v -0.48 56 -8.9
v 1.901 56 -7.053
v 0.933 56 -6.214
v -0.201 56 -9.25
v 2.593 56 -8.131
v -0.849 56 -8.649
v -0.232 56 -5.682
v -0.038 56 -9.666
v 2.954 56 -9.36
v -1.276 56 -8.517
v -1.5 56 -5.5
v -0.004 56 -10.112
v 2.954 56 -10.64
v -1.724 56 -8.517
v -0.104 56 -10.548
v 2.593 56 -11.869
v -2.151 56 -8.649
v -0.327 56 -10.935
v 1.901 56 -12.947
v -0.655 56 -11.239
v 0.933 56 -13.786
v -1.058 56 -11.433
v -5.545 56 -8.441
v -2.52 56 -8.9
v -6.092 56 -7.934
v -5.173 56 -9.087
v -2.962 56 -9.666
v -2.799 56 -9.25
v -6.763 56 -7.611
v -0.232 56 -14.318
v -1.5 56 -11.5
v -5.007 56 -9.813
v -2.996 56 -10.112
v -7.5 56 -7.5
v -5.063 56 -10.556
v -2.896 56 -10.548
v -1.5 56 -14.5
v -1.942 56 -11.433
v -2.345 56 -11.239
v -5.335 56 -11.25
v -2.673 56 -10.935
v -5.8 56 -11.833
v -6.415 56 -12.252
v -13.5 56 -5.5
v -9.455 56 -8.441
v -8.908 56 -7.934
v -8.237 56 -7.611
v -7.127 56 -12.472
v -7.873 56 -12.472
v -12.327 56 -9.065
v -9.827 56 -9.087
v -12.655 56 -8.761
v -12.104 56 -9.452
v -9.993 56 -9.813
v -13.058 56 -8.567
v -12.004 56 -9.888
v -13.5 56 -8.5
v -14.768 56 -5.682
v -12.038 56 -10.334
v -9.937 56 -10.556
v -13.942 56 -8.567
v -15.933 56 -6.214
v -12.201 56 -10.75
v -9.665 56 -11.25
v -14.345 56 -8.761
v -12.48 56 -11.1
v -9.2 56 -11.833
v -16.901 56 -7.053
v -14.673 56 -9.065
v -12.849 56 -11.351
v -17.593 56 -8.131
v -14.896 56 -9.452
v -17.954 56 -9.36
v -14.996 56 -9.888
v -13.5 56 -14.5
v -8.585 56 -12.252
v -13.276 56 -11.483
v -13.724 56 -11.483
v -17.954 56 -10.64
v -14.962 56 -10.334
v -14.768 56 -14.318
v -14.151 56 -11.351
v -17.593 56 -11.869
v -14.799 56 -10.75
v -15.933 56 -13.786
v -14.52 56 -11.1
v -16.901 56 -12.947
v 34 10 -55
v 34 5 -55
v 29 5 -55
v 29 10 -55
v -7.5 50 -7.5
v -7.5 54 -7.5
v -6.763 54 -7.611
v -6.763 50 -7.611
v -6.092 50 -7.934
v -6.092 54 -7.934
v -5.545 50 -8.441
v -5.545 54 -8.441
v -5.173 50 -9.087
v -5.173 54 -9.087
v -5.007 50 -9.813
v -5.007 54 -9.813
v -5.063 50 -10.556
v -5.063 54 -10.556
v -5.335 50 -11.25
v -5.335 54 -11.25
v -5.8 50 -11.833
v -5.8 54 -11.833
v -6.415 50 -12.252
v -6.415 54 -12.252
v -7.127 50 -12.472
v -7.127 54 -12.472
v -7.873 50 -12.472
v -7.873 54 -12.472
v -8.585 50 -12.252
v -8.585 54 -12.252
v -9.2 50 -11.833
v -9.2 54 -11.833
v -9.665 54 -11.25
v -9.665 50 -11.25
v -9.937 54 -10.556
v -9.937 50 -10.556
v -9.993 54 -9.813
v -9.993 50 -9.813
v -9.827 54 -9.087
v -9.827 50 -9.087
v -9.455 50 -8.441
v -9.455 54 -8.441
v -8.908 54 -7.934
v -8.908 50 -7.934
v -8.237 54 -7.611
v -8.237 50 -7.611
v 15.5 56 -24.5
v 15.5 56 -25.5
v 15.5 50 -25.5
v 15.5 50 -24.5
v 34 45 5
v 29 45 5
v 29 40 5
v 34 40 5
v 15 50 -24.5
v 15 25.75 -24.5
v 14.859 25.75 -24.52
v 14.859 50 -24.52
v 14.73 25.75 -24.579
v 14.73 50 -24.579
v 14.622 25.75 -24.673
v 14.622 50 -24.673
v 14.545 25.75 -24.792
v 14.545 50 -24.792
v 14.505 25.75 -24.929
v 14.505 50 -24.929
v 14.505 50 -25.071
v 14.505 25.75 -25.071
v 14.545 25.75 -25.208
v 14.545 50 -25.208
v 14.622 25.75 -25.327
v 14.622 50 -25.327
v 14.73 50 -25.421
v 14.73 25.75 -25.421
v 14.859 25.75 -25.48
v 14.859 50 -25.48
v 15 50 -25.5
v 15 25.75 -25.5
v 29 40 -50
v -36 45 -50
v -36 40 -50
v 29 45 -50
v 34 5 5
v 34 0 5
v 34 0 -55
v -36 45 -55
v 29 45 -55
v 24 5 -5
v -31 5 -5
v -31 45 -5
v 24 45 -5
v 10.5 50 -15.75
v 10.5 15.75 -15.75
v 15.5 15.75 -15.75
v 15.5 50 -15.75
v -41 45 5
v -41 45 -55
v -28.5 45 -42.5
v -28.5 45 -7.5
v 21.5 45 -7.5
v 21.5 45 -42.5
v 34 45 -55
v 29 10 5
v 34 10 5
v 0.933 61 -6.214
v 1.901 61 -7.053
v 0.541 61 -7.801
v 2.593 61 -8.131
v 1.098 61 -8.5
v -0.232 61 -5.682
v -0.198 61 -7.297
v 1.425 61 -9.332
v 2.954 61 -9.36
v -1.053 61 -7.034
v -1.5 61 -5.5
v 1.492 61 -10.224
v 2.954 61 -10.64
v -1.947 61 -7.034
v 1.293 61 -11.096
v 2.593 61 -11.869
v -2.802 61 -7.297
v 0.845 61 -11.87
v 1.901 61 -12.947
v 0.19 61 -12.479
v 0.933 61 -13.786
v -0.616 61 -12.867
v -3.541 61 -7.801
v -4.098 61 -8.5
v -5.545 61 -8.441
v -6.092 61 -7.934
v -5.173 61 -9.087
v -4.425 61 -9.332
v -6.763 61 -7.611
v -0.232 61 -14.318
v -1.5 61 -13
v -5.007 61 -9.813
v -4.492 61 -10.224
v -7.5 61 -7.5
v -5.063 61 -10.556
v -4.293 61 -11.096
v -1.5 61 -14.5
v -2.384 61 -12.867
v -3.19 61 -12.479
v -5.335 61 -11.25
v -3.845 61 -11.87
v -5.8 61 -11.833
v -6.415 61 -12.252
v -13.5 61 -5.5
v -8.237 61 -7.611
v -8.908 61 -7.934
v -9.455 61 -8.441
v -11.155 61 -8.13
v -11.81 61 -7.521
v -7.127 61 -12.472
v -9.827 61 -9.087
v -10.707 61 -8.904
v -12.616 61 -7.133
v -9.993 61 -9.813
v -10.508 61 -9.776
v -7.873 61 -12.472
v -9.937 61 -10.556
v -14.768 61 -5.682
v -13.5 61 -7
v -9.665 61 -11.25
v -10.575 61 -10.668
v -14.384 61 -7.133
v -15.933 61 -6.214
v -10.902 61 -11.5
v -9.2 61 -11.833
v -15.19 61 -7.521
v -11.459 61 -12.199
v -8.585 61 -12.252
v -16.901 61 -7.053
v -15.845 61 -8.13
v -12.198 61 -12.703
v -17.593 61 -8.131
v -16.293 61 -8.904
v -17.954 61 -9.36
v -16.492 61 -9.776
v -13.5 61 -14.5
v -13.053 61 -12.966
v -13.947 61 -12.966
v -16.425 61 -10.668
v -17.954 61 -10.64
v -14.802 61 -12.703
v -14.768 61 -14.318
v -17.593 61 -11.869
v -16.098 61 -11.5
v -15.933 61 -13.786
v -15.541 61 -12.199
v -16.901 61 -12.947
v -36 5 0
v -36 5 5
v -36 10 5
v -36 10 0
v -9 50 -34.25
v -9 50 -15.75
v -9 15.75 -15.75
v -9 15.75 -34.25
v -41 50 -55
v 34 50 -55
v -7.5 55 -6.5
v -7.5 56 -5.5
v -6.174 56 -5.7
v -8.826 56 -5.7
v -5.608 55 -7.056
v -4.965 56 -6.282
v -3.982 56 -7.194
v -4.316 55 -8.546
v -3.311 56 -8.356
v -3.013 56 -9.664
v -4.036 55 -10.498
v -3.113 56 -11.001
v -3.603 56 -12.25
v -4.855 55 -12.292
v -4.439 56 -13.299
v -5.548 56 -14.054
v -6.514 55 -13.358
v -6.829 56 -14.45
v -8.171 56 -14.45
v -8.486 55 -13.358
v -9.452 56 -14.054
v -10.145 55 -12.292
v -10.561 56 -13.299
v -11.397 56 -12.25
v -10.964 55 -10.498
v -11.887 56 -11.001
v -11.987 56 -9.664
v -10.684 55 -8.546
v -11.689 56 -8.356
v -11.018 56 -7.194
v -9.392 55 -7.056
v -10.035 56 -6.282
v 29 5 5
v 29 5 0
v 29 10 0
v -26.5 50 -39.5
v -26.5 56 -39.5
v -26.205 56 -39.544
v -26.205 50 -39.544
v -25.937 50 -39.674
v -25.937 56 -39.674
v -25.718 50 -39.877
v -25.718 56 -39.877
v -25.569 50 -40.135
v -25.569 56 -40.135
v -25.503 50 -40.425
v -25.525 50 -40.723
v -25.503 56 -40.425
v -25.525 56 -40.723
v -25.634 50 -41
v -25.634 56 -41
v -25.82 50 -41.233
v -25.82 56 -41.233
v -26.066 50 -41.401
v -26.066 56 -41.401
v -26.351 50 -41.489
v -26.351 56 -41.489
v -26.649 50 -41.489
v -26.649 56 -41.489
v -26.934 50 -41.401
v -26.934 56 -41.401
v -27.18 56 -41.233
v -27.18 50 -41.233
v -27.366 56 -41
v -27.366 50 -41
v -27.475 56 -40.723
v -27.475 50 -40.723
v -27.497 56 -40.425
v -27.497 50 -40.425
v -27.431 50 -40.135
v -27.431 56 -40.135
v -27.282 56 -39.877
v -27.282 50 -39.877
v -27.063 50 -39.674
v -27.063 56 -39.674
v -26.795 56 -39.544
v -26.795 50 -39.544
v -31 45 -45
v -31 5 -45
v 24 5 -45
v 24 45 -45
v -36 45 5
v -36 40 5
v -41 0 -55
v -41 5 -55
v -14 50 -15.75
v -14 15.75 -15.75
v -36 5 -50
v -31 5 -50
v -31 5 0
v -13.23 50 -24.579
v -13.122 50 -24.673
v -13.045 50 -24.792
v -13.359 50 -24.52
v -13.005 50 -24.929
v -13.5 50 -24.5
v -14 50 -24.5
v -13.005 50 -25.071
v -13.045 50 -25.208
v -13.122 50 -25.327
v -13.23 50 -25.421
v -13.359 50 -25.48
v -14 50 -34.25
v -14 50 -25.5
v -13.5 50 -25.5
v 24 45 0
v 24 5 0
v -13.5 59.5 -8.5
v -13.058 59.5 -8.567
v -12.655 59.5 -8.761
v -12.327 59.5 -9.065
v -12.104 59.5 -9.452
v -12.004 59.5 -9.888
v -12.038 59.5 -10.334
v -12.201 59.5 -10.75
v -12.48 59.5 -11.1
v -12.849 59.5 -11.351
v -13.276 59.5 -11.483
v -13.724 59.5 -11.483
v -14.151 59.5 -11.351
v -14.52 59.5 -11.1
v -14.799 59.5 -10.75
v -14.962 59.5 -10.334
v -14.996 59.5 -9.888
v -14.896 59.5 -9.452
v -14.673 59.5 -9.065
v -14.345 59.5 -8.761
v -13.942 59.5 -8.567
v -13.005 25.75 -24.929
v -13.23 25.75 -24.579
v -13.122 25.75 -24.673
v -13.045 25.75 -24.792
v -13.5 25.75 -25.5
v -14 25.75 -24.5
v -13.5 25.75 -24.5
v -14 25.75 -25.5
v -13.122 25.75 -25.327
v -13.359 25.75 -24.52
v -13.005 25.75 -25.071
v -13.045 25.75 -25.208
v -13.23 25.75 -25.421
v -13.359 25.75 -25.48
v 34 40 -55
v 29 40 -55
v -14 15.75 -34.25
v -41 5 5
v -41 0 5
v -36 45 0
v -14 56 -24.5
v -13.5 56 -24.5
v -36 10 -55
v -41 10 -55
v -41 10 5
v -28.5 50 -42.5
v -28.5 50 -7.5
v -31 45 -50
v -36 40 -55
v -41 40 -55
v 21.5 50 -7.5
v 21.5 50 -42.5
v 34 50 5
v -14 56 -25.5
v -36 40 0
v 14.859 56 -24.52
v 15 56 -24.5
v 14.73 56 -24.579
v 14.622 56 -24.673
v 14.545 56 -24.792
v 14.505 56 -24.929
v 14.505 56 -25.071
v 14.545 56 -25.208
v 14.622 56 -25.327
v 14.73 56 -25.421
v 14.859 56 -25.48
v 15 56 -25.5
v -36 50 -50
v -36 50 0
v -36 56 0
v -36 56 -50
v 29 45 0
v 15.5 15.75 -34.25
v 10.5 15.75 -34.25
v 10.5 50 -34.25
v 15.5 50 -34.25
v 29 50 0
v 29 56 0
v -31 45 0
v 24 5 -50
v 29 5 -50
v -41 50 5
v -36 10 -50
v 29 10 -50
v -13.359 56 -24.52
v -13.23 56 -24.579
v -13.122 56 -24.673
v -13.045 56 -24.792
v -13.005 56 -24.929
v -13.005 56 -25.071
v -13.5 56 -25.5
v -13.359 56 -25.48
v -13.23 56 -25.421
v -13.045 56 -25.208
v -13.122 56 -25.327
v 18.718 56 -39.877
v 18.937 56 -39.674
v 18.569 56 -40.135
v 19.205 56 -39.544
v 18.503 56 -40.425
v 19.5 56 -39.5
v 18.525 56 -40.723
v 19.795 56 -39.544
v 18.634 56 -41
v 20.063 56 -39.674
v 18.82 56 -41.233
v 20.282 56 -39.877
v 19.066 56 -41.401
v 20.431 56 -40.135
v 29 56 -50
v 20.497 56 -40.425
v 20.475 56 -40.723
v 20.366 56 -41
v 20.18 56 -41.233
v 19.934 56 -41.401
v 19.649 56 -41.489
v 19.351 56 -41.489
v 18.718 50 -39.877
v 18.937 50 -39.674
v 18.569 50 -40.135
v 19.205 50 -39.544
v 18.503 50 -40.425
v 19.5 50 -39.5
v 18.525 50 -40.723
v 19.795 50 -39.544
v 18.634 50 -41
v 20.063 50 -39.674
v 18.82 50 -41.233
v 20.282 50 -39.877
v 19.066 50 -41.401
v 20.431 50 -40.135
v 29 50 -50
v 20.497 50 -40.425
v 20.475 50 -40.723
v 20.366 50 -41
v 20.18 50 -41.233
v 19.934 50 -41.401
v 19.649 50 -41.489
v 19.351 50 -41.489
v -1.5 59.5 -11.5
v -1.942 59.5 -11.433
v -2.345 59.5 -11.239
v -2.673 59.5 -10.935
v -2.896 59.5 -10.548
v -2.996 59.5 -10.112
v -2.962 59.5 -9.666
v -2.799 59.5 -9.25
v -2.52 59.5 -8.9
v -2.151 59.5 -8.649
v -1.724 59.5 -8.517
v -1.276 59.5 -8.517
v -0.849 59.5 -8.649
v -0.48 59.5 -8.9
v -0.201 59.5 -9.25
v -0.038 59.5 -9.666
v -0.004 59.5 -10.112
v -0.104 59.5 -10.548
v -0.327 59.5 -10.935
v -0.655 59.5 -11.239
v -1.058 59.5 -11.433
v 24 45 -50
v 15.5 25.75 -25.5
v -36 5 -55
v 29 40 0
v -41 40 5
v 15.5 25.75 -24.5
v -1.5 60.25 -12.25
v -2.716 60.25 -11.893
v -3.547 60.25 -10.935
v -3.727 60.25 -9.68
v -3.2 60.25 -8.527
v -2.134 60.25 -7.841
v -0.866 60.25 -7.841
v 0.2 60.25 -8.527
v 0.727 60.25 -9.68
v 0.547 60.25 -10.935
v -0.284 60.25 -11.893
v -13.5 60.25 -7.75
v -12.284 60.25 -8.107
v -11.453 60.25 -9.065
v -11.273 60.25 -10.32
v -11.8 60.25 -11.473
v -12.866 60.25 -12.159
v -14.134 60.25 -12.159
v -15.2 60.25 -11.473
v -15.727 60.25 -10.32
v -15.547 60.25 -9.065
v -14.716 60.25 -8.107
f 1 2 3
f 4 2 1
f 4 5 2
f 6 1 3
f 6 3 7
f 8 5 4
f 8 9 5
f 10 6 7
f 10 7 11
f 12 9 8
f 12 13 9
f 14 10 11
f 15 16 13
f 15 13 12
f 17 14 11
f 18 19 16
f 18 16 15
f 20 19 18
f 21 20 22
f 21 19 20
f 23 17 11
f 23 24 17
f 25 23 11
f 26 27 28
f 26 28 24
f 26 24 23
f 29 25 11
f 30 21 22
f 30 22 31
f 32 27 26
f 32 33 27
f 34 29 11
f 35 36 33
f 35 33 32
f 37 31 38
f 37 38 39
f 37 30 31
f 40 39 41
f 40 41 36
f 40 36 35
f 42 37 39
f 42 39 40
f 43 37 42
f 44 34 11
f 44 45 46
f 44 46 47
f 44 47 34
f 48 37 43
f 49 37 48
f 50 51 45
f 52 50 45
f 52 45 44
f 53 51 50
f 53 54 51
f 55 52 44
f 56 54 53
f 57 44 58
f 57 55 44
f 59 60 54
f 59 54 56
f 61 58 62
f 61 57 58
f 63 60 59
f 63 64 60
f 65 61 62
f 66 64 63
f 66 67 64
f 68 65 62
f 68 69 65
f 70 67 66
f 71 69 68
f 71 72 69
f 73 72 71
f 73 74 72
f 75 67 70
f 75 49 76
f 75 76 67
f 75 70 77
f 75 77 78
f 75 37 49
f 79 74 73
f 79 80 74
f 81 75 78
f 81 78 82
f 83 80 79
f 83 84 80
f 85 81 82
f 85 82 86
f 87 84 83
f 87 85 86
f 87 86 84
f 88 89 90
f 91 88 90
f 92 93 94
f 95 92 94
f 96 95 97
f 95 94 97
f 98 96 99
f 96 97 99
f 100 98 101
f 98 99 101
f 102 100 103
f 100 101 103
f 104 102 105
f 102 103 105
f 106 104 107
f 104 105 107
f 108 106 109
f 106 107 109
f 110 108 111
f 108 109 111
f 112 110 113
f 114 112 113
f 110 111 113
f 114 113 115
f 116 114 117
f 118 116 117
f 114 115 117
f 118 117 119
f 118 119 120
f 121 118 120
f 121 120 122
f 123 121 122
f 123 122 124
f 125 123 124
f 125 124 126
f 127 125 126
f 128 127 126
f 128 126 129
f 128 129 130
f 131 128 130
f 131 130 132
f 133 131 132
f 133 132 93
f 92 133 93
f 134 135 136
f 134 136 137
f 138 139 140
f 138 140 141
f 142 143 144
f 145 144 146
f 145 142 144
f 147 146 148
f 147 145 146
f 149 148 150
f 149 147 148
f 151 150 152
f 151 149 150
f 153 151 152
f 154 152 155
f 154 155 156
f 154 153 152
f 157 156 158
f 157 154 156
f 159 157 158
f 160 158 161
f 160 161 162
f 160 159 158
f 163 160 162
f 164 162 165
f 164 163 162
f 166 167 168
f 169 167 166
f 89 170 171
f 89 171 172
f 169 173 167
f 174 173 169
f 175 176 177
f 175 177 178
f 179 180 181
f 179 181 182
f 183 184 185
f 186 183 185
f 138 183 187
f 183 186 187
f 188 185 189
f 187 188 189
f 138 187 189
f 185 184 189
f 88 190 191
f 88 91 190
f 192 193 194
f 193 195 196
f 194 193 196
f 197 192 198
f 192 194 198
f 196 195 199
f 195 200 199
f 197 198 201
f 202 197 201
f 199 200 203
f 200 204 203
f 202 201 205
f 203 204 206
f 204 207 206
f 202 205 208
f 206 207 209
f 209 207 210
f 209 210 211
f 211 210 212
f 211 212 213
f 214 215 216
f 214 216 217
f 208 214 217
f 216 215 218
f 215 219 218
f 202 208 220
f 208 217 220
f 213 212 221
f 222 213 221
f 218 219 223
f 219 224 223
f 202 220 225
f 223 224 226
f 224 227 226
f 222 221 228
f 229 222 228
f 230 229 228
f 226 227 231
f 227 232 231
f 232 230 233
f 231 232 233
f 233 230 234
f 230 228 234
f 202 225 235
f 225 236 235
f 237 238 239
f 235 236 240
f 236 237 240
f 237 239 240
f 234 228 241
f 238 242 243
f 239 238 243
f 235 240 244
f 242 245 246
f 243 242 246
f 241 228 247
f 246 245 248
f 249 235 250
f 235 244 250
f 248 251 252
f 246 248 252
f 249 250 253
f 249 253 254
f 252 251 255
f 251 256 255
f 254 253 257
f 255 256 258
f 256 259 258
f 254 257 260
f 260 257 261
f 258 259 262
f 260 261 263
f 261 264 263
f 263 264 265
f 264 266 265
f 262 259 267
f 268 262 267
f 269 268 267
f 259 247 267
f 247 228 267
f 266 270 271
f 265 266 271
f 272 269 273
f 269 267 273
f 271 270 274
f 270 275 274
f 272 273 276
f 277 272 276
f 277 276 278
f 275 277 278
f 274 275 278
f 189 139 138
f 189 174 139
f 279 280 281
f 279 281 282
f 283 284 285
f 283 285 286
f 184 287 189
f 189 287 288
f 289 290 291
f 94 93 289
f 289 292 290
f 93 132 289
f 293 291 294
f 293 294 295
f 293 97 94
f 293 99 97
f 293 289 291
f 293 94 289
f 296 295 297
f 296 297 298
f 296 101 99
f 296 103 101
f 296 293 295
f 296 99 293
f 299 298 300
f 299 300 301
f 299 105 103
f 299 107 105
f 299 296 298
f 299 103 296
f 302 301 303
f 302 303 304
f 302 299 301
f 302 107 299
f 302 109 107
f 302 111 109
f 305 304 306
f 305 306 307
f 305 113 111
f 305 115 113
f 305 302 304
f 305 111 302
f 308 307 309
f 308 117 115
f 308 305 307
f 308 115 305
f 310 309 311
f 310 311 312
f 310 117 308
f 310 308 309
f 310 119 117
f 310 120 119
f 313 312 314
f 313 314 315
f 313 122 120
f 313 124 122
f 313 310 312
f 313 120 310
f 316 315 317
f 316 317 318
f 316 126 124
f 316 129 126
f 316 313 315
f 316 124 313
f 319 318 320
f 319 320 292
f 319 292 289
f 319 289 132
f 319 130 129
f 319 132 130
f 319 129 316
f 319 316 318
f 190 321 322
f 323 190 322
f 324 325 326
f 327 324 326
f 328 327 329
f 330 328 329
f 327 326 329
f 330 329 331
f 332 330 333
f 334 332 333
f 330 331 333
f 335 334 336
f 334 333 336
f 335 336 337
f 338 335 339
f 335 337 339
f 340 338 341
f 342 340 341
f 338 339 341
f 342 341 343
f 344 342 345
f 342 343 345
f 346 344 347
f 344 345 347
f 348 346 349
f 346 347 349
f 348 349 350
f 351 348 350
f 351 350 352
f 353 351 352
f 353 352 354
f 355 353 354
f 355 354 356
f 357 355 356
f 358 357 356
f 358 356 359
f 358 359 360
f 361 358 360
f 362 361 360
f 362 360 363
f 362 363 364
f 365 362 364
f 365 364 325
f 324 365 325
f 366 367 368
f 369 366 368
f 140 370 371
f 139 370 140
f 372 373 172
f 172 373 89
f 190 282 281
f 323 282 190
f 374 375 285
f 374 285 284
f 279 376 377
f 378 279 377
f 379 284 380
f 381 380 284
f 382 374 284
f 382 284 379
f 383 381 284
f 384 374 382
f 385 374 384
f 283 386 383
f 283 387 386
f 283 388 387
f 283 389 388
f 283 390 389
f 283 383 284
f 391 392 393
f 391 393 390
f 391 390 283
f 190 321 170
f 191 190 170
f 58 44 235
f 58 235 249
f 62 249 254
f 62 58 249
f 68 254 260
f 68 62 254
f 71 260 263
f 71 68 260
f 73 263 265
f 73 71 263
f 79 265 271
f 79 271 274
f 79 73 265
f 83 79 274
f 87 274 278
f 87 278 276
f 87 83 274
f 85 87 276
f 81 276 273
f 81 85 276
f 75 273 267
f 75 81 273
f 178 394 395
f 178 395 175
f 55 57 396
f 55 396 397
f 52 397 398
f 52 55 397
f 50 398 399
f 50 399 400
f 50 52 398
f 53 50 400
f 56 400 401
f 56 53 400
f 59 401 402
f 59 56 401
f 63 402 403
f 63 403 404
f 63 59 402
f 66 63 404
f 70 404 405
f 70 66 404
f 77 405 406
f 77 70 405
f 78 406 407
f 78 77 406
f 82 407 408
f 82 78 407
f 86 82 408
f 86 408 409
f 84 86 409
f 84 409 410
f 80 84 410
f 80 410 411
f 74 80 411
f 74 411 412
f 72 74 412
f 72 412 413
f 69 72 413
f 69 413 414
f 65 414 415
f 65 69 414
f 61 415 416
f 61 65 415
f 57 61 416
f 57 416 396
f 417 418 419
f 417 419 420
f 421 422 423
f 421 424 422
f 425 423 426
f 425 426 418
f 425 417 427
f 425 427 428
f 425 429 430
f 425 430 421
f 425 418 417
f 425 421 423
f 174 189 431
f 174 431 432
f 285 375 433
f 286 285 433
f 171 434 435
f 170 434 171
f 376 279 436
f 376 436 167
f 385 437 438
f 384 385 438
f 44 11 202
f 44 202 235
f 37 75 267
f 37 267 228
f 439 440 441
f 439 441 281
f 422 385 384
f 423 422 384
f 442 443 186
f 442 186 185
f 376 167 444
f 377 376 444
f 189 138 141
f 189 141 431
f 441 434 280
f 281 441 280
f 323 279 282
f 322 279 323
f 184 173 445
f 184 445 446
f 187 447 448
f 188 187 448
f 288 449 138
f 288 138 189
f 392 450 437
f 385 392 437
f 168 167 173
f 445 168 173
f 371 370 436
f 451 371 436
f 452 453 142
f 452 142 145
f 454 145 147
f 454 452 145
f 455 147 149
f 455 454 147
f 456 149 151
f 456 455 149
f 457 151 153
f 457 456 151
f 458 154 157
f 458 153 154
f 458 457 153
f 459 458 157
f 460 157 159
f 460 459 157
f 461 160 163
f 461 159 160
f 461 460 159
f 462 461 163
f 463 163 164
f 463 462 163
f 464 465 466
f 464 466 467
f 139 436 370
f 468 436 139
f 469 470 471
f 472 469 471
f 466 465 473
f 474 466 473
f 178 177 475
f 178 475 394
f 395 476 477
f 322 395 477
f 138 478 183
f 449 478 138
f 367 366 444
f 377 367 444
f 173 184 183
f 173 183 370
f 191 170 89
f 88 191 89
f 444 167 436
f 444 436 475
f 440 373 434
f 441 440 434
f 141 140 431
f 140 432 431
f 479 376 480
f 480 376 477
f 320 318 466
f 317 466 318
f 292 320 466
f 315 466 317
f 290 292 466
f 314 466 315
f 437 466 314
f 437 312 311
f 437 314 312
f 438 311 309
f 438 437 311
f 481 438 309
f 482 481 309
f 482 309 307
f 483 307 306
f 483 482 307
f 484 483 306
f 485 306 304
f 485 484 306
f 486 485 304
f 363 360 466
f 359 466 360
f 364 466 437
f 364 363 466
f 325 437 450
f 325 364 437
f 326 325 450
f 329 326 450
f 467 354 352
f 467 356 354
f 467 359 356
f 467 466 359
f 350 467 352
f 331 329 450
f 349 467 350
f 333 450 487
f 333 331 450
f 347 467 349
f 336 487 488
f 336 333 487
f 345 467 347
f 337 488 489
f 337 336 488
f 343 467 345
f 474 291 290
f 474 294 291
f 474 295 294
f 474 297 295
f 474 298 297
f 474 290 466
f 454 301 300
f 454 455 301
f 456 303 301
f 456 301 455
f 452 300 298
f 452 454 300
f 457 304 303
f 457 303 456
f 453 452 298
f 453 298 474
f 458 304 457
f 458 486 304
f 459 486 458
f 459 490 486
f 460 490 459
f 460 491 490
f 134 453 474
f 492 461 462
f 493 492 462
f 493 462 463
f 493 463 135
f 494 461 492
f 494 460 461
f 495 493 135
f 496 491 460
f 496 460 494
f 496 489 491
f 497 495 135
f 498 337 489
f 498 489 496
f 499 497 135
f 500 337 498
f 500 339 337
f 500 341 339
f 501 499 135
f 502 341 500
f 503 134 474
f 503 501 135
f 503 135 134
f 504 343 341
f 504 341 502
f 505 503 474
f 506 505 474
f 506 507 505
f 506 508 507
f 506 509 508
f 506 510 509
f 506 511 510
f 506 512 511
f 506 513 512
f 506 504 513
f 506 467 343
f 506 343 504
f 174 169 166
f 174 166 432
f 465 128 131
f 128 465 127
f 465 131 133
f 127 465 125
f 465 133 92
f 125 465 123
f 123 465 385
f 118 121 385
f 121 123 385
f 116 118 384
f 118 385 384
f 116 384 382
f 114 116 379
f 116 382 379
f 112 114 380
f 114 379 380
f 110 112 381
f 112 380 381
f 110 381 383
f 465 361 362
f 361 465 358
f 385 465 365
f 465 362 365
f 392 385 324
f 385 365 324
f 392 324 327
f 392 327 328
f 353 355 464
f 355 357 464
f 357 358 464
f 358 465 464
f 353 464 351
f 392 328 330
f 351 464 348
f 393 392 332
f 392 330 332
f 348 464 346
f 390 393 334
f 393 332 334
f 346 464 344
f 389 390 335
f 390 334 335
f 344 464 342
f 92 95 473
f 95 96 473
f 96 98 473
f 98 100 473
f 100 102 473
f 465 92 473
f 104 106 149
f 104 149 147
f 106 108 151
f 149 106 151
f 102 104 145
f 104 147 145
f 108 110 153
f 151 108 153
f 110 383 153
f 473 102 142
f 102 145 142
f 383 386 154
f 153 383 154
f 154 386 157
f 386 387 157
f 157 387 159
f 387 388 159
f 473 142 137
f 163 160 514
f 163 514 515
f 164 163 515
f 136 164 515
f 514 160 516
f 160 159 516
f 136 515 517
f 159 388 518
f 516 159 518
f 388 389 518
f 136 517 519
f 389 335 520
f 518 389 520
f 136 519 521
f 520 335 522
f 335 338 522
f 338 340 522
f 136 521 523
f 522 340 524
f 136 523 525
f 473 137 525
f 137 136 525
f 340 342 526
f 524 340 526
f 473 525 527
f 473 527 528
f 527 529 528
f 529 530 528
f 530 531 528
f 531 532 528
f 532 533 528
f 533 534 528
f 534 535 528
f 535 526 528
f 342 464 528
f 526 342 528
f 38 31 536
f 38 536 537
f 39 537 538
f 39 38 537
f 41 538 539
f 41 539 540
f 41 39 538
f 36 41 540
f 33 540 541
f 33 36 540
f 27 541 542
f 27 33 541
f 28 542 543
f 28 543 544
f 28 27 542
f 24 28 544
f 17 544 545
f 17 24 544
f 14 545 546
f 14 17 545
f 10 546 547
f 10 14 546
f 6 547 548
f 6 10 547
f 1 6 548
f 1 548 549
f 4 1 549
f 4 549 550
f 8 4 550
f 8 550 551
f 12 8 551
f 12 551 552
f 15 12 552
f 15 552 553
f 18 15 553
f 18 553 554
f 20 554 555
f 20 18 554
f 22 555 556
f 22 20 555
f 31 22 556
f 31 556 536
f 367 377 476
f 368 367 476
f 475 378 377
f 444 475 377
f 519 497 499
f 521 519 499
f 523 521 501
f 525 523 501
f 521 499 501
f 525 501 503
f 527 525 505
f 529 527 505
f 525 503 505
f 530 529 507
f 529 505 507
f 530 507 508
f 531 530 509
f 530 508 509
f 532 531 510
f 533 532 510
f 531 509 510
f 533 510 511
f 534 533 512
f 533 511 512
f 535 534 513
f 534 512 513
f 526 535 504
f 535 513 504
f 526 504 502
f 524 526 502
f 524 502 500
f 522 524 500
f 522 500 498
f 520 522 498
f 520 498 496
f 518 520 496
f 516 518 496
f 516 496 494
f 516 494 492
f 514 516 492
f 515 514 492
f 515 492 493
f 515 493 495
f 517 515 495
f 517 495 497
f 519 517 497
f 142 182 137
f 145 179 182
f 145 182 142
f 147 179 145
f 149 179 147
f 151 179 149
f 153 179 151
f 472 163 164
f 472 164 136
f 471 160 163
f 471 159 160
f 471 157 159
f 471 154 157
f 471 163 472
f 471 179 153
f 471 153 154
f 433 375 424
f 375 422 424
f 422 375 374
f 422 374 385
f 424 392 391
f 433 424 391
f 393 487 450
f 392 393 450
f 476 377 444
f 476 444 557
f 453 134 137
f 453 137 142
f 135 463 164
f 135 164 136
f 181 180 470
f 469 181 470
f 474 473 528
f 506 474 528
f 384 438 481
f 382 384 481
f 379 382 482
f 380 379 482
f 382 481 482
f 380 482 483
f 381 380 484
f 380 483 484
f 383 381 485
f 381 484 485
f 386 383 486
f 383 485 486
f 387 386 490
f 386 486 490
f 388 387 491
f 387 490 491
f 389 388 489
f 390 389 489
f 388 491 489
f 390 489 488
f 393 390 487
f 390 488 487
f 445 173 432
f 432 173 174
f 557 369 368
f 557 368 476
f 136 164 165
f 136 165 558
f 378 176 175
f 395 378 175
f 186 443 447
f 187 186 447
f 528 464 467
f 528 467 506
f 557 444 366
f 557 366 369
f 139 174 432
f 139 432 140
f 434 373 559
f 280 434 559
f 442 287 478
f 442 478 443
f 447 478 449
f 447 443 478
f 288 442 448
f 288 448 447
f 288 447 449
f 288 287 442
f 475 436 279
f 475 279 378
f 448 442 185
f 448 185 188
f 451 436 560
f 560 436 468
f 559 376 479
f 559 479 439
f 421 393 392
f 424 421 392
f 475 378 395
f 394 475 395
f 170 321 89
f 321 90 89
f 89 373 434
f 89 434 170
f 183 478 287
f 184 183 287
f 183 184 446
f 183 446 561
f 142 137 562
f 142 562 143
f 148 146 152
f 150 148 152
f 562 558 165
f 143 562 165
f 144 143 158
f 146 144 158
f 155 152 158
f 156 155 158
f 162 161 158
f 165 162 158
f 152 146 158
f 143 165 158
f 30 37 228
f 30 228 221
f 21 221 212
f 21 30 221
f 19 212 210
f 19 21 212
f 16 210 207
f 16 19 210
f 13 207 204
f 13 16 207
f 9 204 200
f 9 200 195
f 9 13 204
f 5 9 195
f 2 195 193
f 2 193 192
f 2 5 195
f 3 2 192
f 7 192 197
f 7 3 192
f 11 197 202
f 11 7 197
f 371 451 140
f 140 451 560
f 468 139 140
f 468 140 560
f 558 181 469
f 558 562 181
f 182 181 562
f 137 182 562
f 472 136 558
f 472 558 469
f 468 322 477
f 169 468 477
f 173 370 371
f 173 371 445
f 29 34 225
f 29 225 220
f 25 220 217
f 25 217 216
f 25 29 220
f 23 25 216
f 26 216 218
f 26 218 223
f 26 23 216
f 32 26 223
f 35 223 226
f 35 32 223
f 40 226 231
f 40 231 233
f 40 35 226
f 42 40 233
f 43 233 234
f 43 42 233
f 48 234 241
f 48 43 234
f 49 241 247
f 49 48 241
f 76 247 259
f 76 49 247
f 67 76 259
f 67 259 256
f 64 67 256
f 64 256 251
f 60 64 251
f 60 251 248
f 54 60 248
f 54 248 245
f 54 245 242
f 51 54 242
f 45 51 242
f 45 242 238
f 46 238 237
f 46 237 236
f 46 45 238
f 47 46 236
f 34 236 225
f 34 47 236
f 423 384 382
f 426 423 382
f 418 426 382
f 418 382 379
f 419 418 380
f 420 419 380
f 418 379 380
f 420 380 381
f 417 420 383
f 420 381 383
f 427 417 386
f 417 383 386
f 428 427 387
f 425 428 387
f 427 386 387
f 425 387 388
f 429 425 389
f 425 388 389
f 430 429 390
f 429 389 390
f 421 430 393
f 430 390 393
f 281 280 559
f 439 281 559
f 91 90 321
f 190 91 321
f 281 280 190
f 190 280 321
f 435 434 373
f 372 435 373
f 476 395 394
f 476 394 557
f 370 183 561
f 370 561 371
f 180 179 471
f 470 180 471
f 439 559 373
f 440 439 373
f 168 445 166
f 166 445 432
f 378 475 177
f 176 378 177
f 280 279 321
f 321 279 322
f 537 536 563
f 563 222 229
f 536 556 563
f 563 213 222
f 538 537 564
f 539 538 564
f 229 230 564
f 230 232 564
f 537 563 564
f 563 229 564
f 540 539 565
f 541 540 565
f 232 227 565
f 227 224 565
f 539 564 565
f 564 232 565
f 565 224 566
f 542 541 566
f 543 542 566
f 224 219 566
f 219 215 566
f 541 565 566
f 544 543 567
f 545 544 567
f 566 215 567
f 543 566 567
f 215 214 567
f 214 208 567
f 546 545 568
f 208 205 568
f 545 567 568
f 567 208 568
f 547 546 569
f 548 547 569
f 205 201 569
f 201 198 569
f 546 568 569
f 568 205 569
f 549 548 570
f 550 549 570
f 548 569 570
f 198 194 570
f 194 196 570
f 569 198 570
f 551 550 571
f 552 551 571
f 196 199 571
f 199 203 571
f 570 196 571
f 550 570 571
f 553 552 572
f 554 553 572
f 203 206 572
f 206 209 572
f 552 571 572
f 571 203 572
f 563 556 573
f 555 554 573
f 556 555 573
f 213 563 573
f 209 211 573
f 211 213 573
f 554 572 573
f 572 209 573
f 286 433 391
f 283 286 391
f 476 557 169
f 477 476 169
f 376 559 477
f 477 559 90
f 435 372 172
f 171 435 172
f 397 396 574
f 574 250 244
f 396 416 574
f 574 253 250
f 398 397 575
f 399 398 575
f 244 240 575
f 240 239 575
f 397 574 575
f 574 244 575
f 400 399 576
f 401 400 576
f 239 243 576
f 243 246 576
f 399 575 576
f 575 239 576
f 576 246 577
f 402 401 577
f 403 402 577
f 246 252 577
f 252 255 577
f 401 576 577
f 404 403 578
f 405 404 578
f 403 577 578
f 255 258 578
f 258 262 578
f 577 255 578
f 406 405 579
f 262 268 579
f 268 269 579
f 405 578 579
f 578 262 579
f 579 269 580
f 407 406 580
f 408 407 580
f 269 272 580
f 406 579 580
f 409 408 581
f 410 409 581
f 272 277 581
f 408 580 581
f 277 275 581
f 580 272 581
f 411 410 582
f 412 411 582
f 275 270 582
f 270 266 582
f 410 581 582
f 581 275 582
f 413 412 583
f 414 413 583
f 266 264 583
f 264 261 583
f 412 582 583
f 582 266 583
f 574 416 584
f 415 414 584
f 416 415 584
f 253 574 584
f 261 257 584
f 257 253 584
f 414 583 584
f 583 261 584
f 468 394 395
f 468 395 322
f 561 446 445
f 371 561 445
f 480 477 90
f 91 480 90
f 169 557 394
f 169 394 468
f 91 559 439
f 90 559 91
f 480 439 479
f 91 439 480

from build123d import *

# Parameters (mm, degrees)
SKETCH1_W              = 65
SKETCH1_H              = 50
BOSS_EXTRUDE1_DEPTH    = 5
SKETCH2_W              = 5
SKETCH2_H              = 50
BOSS_EXTRUDE24_DEPTH   = 40
BOSS_EXTRUDE24_2_DEPTH = 40
SKETCH2_6_W            = 55
SKETCH2_6_H            = 5
BOSS_EXTRUDE25_DEPTH   = 40
BOSS_EXTRUDE25_2_DEPTH = 40
SKETCH3_W              = 65
SKETCH3_H              = 50
BOSS_EXTRUDE4_DEPTH    = 5
SKETCH18_W             = 50
SKETCH18_H             = 35
CUT_EXTRUDE3_DEPTH     = 80.3473377
SKETCH17_W             = 65
SKETCH17_H             = 50
BOSS_EXTRUDE8_DEPTH    = 6
SKETCH6_W              = 18.5
SKETCH6_H              = 34.25
BOSS_EXTRUDE6_DEPTH    = 5
SKETCH7_W              = 18.5
SKETCH7_H              = 34.25
BOSS_EXTRUDE7_DEPTH    = 5
SKETCH19_R             = 1
SKETCH19_R_2           = 2.5
CUT_EXTRUDE4_DEPTH     = 30.25
SKETCH31_R             = 2.5
SKETCH31_R_2           = 1.5
BOSS_EXTRUDE18_DEPTH   = 5
CHAMFER1_SIZE          = 2
CHAMFER2_SIZE          = 1.5
SKETCH42_W             = 75
SKETCH42_H             = 60
SKETCH42_W_2           = 65
SKETCH42_H_2           = 50
BOSS_EXTRUDE22_DEPTH   = 5
SKETCH41_4_W           = 75
SKETCH41_4_H           = 60
BOSS_EXTRUDE23_DEPTH   = 5
BOSS_EXTRUDE20_DEPTH   = 5
BOSS_EXTRUDE20_2_DEPTH = 5
SKETCH41_3_W           = 65
SKETCH41_3_H           = 5
BOSS_EXTRUDE21_DEPTH   = 5
BOSS_EXTRUDE21_2_DEPTH = 5


with BuildPart() as part:
    # Sketch1 → Boss-Extrude1 (new body)
    with BuildSketch(Plane(origin=(0, 0, 0), x_dir=(1, 0, 0), z_dir=(0, 1, 0))):
        with Locations((-3.5, 25)):
            Rectangle(SKETCH1_W, SKETCH1_H)
    extrude(amount=BOSS_EXTRUDE1_DEPTH)

    # Sketch41<4> → Boss-Extrude23 (add)
    with BuildSketch(Plane(origin=(0, 5, 0), x_dir=(1, 0, 0), z_dir=(0, 1, 0))):
        with Locations((-3.5, 25)):
            Rectangle(SKETCH41_4_W, SKETCH41_4_H)
    extrude(amount=-BOSS_EXTRUDE23_DEPTH)


with BuildPart() as body_2:
    # Sketch2 → Boss-Extrude24 (new body)
    with BuildSketch(Plane(origin=(0, 5, 0), x_dir=(1, 0, 0), z_dir=(0, 1, 0))):
        with Locations((-33.5, 25)):
            Rectangle(SKETCH2_W, SKETCH2_H)
    extrude(amount=BOSS_EXTRUDE24_DEPTH)


with BuildPart() as body_3:
    # Sketch2 → Boss-Extrude24 2 (new body)
    with BuildSketch(Plane(origin=(0, 5, 0), x_dir=(1, 0, 0), z_dir=(0, 1, 0))):
        with Locations((26.5, 25)):
            Rectangle(SKETCH2_W, SKETCH2_H)
    extrude(amount=BOSS_EXTRUDE24_2_DEPTH)


with BuildPart() as body_4:
    # Sketch2<6> → Boss-Extrude25 (new body)
    with BuildSketch(Plane(origin=(0, 5, 0), x_dir=(1, 0, 0), z_dir=(0, 1, 0))):
        with Locations((-3.5, 47.5)):
            Rectangle(SKETCH2_6_W, SKETCH2_6_H)
    extrude(amount=BOSS_EXTRUDE25_DEPTH)


with BuildPart() as body_5:
    # Sketch2<6> → Boss-Extrude25 2 (new body)
    with BuildSketch(Plane(origin=(0, 5, 0), x_dir=(1, 0, 0), z_dir=(0, 1, 0))):
        with Locations((-3.5, 2.5)):
            Rectangle(SKETCH2_6_W, SKETCH2_6_H)
    extrude(amount=BOSS_EXTRUDE25_2_DEPTH)


with BuildPart() as body_6:
    # Sketch3 → Boss-Extrude4 (new body)
    with BuildSketch(Plane(origin=(0, 45, 0), x_dir=(1, 0, 0), z_dir=(0, 1, 0))):
        with Locations((-3.5, 25)):
            Rectangle(SKETCH3_W, SKETCH3_H)
    extrude(amount=BOSS_EXTRUDE4_DEPTH)

    # Sketch18 → Cut-Extrude3 (cut, through all)
    with BuildSketch(Plane(origin=(0, 50, 0), x_dir=(1, 0, 0), z_dir=(0, 1, 0))):
        with Locations((-3.5, 25)):
            Rectangle(SKETCH18_W, SKETCH18_H)
    extrude(amount=-CUT_EXTRUDE3_DEPTH, mode=Mode.SUBTRACT)

    # Sketch42 → Boss-Extrude22 (add)
    with BuildSketch(Plane(origin=(0, 50, 0), x_dir=(1, 0, 0), z_dir=(0, 1, 0))):
        with Locations((-3.5, 25)):
            Rectangle(SKETCH42_W, SKETCH42_H)
        with Locations((-3.5, 25)):
            Rectangle(SKETCH42_W_2, SKETCH42_H_2, mode=Mode.SUBTRACT)
    extrude(amount=-BOSS_EXTRUDE22_DEPTH)


with BuildPart() as body_7:
    # Sketch17 → Boss-Extrude8 (new body)
    with BuildSketch(Plane(origin=(0, 50, 0), x_dir=(1, 0, 0), z_dir=(0, 1, 0))):
        with Locations((-3.5, 25)):
            Rectangle(SKETCH17_W, SKETCH17_H)
    extrude(amount=BOSS_EXTRUDE8_DEPTH)


with BuildPart() as body_8:
    # Sketch6 → Boss-Extrude6 (new body)
    with BuildSketch(Plane(origin=(-14, 0, 0), x_dir=(0, 0, -1), z_dir=(1, 0, 0))):
        with Locations((25, 32.875)):
            Rectangle(SKETCH6_W, SKETCH6_H)
    extrude(amount=BOSS_EXTRUDE6_DEPTH)


with BuildPart() as body_9:
    # Sketch7 → Boss-Extrude7 (new body)
    with BuildSketch(Plane(origin=(10.5, 0, 0), x_dir=(0, 0, -1), z_dir=(1, 0, 0))):
        with Locations((25, 32.875)):
            Rectangle(SKETCH7_W, SKETCH7_H)
    extrude(amount=BOSS_EXTRUDE7_DEPTH)


with BuildPart() as cut_extrude4_tool:
    # Sketch19 → Cut-Extrude4 (new body)
    with BuildSketch(Plane(origin=(0, 56, 0), x_dir=(1, 0, 0), z_dir=(0, 1, 0))):
        with Locations(Location((-26.5, 40.5, 0), (0, 0, 270))):
            Circle(SKETCH19_R)
        with BuildLine():
            Line((-14, 24.5), (-13.5, 24.5))
            ThreePointArc((-13.5, 24.5), (-13, 25), (-13.5, 25.5))
            Line((-13.5, 25.5), (-14, 25.5))
            Line((-14, 25.5), (-14, 24.5))
        make_face()
        with Locations(Location((-7.5, 10, 0), (0, 0, 270))):
            Circle(SKETCH19_R_2)
        with Locations(Location((19.5, 40.5, 0), (0, 0, 270))):
            Circle(SKETCH19_R)
        with BuildLine():
            ThreePointArc((15, 24.5), (14.5, 25), (15, 25.5))
            Line((15, 25.5), (15.5, 25.5))
            Line((15.5, 25.5), (15.5, 24.5))
            Line((15.5, 24.5), (15, 24.5))
        make_face()
    extrude(amount=-CUT_EXTRUDE4_DEPTH)


with BuildPart() as body_7_1:
    add(body_7.part)

    # Cut-Extrude4: cut by cut_extrude4_tool
    add(cut_extrude4_tool.part, mode=Mode.SUBTRACT)

    # Chamfer1
    chamfer1_edges = [body_7_1.edges().sort_by_distance(p)[0] for p in [
        (-7.5, 56, -12.5),
    ]]
    chamfer(chamfer1_edges, length=CHAMFER1_SIZE)


with BuildPart() as body_8_1:
    add(body_8.part)

    # Cut-Extrude4: cut by cut_extrude4_tool
    add(cut_extrude4_tool.part, mode=Mode.SUBTRACT)


with BuildPart() as body_9_1:
    add(body_9.part)

    # Cut-Extrude4: cut by cut_extrude4_tool
    add(cut_extrude4_tool.part, mode=Mode.SUBTRACT)


with BuildPart() as body_10:
    # Sketch31 → Boss-Extrude18 (new body)
    with BuildSketch(Plane(origin=(0, 56, 0), x_dir=(1, 0, 0), z_dir=(0, 1, 0))):
        with BuildLine():
            Line((-1.5, 5.5), (-13.5, 5.5))
            ThreePointArc((-13.5, 5.5), (-18, 10), (-13.5, 14.5))
            Line((-13.5, 14.5), (-1.5, 14.5))
            ThreePointArc((-1.5, 14.5), (3, 10), (-1.5, 5.5))
        make_face()
        with Locations(Location((-7.5, 10, 0), (0, 0, 270))):
            Circle(SKETCH31_R, mode=Mode.SUBTRACT)
        with Locations(Location((-13.5, 10, 0), (0, 0, 270))):
            Circle(SKETCH31_R_2, mode=Mode.SUBTRACT)
        with Locations(Location((-1.5, 10, 0), (0, 0, 90))):
            Circle(SKETCH31_R_2, mode=Mode.SUBTRACT)
    extrude(amount=BOSS_EXTRUDE18_DEPTH)

    # Chamfer2
    chamfer2_edges = [body_10.edges().sort_by_distance(p)[0] for p in [
        (-13.5, 61, -11.5),
        (-1.5, 61, -8.5),
    ]]
    chamfer(chamfer2_edges, length=CHAMFER2_SIZE)


with BuildPart() as body_11:
    # Sketch41 → Boss-Extrude20 (new body)
    with BuildSketch(Plane(origin=(0, 5, 0), x_dir=(1, 0, 0), z_dir=(0, 1, 0))):
        Polygon((-36, -5), (-36, 0), (-36, 50), (-36, 55), (-41, 55), (-41, -5), align=None)
    extrude(amount=BOSS_EXTRUDE20_DEPTH)


with BuildPart() as body_12:
    # Sketch41 → Boss-Extrude20 2 (new body)
    with BuildSketch(Plane(origin=(0, 5, 0), x_dir=(1, 0, 0), z_dir=(0, 1, 0))):
        Polygon((29, 50), (29, 0), (29, -5), (34, -5), (34, 55), (29, 55), align=None)
    extrude(amount=BOSS_EXTRUDE20_2_DEPTH)


with BuildPart() as body_13:
    # Sketch41<3> → Boss-Extrude21 (new body)
    with BuildSketch(Plane(origin=(0, 5, 0), x_dir=(1, 0, 0), z_dir=(0, 1, 0))):
        with Locations((-3.5, 52.5)):
            Rectangle(SKETCH41_3_W, SKETCH41_3_H)
    extrude(amount=BOSS_EXTRUDE21_DEPTH)


with BuildPart() as body_14:
    # Sketch41<3> → Boss-Extrude21 2 (new body)
    with BuildSketch(Plane(origin=(0, 5, 0), x_dir=(1, 0, 0), z_dir=(0, 1, 0))):
        with Locations((-3.5, -2.5)):
            Rectangle(SKETCH41_3_W, SKETCH41_3_H)
    extrude(amount=BOSS_EXTRUDE21_2_DEPTH)


with BuildPart() as body_15:
    # Mirror1: mirrored copy
    add(body_13.part.mirror(Plane(origin=(0, 25, 0), x_dir=(0, 0, 1), z_dir=(0, -1, 0))))


with BuildPart() as body_16:
    # Mirror1 2: mirrored copy
    add(body_12.part.mirror(Plane(origin=(0, 25, 0), x_dir=(0, 0, 1), z_dir=(0, -1, 0))))


with BuildPart() as body_17:
    # Mirror1 3: mirrored copy
    add(body_11.part.mirror(Plane(origin=(0, 25, 0), x_dir=(0, 0, 1), z_dir=(0, -1, 0))))


with BuildPart() as body_18:
    # Mirror1 4: mirrored copy
    add(body_14.part.mirror(Plane(origin=(0, 25, 0), x_dir=(0, 0, 1), z_dir=(0, -1, 0))))


solid = Compound([part.part, body_2.part, body_3.part, body_4.part, body_5.part, body_6.part, body_7_1.part, body_8_1.part, body_9_1.part, body_10.part, body_11.part, body_12.part, body_13.part, body_14.part, body_15.part, body_16.part, body_17.part, body_18.part])
